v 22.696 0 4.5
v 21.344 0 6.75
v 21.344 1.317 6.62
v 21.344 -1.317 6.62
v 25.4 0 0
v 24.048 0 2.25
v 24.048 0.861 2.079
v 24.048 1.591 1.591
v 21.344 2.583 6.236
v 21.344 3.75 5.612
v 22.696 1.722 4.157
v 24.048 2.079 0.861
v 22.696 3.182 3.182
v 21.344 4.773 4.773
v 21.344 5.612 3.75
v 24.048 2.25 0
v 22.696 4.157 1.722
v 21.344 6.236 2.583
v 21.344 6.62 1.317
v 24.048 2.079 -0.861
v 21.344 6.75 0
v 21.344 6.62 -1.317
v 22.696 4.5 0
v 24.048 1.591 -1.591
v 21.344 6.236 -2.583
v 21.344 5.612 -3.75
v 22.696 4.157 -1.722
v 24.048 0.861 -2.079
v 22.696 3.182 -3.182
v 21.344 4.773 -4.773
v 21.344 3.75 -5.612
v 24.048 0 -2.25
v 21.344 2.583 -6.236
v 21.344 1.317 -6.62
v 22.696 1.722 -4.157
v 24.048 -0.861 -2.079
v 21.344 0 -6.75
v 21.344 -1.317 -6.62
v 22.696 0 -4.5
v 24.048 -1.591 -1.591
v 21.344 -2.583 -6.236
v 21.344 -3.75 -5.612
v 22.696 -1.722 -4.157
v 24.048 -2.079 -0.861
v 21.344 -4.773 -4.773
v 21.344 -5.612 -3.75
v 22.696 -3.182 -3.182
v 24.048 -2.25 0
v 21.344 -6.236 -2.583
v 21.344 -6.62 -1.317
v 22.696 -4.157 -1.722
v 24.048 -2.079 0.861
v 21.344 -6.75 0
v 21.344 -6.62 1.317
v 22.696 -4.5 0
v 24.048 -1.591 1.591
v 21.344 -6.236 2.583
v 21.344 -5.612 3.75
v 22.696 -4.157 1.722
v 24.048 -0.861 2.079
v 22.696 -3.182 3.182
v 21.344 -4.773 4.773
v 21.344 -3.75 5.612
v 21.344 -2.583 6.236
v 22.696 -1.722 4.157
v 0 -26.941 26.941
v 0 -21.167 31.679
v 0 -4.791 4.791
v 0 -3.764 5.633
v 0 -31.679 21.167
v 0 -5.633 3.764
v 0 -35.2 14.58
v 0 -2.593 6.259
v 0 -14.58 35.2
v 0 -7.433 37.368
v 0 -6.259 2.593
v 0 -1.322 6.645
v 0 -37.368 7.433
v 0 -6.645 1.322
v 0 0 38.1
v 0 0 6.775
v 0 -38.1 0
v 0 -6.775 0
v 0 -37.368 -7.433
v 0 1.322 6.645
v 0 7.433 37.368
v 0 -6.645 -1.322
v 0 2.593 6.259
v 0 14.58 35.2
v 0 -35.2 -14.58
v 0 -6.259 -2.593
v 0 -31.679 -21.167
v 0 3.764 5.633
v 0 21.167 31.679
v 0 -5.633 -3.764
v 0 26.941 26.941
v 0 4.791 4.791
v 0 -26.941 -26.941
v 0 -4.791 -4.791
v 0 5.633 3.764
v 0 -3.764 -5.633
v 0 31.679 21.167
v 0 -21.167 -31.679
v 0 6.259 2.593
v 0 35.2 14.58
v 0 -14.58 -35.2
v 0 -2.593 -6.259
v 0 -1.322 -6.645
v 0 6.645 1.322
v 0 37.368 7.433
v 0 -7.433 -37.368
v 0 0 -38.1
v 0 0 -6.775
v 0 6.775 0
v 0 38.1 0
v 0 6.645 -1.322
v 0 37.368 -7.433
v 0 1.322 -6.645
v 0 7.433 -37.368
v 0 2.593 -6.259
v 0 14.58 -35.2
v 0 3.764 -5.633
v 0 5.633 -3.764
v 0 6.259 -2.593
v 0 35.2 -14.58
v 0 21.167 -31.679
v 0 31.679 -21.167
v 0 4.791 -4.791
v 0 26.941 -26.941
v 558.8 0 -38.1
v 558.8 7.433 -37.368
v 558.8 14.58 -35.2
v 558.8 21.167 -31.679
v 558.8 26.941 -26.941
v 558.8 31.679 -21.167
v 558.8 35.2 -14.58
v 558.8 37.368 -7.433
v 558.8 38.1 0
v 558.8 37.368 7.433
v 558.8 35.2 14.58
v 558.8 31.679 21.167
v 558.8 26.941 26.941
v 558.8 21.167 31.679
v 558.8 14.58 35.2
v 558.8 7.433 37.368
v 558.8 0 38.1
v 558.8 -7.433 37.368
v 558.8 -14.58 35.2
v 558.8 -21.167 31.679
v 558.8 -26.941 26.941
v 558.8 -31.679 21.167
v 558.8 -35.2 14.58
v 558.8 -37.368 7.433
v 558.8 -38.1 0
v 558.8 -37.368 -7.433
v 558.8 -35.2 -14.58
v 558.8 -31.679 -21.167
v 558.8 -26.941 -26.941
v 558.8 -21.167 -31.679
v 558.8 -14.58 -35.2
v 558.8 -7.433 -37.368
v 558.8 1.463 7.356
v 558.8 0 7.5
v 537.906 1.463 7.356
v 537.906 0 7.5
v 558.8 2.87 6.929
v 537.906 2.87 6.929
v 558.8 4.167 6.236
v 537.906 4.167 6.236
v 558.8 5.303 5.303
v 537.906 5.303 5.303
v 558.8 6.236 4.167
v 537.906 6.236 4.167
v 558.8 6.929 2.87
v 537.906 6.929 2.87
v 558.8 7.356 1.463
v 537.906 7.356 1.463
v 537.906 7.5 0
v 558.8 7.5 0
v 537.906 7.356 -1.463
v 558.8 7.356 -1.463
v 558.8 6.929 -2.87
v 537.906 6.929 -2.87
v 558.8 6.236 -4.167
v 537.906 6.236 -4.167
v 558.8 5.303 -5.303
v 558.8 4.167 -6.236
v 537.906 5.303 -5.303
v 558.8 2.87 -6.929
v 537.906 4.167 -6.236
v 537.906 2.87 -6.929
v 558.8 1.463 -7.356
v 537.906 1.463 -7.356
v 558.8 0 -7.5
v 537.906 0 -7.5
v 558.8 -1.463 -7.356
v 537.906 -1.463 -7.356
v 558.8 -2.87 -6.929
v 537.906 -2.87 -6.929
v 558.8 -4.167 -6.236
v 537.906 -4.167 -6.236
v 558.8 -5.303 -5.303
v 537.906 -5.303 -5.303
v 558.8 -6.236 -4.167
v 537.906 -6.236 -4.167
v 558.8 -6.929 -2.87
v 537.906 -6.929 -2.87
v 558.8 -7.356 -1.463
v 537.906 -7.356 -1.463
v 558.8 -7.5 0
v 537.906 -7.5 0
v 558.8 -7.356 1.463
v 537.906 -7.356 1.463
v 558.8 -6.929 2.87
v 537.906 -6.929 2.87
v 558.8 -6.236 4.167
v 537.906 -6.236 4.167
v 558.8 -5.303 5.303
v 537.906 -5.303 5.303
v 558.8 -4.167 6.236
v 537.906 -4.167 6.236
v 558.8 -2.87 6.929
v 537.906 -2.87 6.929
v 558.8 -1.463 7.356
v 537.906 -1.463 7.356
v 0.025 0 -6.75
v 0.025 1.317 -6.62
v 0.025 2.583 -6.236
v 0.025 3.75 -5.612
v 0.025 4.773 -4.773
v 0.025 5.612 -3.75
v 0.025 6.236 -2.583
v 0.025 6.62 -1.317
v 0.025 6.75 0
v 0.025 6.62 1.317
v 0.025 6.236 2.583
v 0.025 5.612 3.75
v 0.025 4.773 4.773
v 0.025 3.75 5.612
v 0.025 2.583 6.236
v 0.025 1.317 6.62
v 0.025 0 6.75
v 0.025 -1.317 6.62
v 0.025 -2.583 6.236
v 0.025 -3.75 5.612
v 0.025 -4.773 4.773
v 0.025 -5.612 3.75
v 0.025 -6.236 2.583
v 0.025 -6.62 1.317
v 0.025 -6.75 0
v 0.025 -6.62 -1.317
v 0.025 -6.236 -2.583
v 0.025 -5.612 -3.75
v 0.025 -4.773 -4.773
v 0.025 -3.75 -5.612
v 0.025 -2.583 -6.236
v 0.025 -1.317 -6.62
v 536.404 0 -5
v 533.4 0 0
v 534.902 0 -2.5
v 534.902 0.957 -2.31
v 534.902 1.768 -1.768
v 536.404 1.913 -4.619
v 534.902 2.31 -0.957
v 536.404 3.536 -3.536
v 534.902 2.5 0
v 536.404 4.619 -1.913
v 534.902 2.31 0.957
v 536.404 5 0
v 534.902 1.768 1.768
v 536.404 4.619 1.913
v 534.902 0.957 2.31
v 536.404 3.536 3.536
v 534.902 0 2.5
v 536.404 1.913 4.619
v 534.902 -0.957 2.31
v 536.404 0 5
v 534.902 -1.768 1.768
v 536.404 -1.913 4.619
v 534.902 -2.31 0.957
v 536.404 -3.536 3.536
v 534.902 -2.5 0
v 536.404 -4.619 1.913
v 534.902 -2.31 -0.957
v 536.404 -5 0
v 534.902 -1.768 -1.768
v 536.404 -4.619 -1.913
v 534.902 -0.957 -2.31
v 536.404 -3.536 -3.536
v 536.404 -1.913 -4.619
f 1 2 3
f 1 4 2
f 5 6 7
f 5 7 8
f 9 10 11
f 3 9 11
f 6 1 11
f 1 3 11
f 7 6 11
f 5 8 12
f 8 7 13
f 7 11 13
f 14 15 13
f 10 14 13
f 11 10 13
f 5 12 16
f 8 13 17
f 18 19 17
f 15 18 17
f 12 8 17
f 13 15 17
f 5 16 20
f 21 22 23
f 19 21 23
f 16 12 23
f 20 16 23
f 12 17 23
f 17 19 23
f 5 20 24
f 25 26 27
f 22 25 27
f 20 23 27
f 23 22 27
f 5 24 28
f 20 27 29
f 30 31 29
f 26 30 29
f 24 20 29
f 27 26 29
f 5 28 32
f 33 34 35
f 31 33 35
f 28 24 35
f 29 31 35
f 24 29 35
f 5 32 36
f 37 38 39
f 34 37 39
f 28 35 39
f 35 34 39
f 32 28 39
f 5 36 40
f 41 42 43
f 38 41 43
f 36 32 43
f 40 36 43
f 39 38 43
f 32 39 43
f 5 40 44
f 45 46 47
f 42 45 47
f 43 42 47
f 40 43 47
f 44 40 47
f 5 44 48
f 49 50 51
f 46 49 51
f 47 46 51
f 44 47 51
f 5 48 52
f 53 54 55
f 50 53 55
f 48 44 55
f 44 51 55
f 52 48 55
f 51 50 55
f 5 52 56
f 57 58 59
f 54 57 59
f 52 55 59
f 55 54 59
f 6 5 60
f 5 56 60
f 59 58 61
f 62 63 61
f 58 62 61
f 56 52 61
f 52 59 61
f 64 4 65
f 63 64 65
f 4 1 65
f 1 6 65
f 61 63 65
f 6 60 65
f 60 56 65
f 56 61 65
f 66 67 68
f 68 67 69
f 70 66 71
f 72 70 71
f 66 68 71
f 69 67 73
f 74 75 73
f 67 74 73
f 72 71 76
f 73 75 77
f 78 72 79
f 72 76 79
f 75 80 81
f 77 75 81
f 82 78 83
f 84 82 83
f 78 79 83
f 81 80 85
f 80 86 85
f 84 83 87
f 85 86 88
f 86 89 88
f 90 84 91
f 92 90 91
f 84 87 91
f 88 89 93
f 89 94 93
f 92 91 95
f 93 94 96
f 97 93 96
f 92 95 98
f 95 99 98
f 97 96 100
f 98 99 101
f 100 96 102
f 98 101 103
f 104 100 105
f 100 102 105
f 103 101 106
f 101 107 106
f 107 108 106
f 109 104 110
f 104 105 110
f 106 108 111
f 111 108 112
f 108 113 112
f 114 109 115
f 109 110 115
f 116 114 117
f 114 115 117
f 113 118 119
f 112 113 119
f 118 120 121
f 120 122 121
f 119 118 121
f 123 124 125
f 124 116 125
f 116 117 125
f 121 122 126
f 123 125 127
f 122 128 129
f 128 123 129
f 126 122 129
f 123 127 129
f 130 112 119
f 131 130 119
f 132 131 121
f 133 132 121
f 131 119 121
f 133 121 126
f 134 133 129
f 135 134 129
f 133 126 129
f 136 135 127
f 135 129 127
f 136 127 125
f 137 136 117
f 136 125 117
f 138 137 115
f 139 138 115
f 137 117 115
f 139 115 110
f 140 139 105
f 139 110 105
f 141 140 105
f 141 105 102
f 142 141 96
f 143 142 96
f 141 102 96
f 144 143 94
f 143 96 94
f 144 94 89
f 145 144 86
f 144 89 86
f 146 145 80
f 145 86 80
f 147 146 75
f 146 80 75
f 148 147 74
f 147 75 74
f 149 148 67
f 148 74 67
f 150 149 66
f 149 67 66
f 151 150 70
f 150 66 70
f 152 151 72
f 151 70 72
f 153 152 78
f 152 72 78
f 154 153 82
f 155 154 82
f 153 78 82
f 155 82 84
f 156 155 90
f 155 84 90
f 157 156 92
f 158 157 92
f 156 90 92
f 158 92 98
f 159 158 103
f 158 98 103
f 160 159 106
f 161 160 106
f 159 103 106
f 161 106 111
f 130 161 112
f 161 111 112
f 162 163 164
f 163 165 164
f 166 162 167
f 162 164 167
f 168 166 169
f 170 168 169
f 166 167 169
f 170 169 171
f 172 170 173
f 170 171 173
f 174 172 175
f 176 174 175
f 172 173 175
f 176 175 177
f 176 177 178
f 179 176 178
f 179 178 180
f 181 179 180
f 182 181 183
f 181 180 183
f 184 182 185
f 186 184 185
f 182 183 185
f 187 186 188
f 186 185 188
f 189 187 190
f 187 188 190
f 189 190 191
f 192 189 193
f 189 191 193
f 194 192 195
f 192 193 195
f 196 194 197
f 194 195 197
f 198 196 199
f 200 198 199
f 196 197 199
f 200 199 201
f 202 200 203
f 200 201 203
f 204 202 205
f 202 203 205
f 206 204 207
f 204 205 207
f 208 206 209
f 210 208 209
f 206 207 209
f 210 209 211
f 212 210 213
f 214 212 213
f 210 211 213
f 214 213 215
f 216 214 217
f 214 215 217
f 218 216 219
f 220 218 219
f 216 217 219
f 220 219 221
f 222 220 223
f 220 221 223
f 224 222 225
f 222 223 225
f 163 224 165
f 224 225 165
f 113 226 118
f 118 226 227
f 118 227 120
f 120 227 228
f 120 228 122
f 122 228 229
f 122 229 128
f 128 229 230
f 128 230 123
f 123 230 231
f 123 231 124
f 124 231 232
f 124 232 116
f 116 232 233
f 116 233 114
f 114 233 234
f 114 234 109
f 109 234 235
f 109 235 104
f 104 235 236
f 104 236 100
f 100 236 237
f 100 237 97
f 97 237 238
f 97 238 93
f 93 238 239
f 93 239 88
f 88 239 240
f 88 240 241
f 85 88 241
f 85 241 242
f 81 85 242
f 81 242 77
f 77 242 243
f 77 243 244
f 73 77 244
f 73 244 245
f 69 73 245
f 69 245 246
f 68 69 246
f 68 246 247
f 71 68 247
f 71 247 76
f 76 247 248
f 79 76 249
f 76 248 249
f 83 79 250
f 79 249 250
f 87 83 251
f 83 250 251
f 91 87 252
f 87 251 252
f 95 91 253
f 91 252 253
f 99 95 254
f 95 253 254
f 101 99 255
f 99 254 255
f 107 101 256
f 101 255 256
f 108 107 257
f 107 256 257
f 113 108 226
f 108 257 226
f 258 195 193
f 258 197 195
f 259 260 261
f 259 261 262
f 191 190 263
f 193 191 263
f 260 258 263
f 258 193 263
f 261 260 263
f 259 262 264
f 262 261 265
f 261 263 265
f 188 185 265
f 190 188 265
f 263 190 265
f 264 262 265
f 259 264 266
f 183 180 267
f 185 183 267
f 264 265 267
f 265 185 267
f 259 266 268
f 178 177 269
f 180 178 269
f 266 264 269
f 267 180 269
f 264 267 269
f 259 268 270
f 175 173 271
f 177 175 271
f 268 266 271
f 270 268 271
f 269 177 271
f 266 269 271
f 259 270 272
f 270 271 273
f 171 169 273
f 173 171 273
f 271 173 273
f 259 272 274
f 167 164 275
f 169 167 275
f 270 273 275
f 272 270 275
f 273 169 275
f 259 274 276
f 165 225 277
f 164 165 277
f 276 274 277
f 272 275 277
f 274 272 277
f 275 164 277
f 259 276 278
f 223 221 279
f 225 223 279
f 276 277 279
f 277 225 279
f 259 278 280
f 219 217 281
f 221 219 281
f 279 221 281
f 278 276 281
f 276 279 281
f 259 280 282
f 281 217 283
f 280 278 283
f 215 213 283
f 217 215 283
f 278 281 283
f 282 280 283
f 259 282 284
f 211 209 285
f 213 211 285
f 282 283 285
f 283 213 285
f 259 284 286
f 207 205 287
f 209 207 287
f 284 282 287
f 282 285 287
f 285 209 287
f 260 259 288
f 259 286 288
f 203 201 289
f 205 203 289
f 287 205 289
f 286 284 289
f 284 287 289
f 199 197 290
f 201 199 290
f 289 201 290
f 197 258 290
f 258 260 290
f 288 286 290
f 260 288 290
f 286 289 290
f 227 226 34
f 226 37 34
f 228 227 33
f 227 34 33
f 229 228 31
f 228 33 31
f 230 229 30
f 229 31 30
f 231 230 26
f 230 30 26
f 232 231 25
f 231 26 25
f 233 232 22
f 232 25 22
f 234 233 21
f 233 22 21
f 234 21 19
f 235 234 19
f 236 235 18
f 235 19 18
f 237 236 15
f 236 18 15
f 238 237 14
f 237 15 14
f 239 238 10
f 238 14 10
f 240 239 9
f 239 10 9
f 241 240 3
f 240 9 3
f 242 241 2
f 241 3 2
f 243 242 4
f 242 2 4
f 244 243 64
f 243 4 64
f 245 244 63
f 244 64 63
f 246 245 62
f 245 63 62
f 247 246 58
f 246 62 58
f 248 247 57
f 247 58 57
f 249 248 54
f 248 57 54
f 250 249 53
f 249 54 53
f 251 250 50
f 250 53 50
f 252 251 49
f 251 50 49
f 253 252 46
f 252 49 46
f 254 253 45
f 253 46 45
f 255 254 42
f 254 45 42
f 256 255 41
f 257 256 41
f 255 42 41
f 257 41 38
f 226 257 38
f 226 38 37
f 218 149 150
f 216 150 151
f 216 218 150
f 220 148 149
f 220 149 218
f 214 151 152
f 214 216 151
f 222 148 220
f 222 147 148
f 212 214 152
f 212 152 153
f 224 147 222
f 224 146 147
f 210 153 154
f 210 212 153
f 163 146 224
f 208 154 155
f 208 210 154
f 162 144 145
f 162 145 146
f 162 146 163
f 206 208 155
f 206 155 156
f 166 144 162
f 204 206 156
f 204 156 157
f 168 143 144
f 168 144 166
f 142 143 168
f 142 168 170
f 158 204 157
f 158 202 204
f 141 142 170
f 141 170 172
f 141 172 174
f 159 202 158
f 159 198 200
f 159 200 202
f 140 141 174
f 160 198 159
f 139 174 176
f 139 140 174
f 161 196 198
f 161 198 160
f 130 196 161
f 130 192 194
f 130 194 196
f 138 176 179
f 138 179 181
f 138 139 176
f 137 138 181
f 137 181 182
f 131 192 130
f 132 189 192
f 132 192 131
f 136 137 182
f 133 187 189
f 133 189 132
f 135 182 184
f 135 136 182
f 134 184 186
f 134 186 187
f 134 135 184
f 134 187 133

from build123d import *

# Parameters (mm, degrees)
SKETCH1_R                       = 38.1
BOSS_EXTRUDE1_DEPTH             = 558.8
M12_CLEARANCE_HOLE1_D           = 13.5
M12_CLEARANCE_HOLE1_DEPTH       = 21.344190822
M12_CLEARANCE_HOLE1_CSINK_D     = 13.55
M12_CLEARANCE_HOLE1_CSINK_ANGLE = 90
M12_CLEARANCE_HOLE1_TIP         = 4.055809178
M12_CLEARANCE_HOLE2_D           = 15
M12_CLEARANCE_HOLE2_DEPTH       = 20.893545357
M12_CLEARANCE_HOLE2_TIP         = 4.506454643


with BuildPart() as part:
    # Sketch1 → Boss-Extrude1 (new body)
    with BuildSketch(Plane(origin=(0, 0, 0), x_dir=(0, 0, -1), z_dir=(1, 0, 0))):
        Circle(SKETCH1_R)
    extrude(amount=BOSS_EXTRUDE1_DEPTH)

    # M12 Clearance Hole1
    with Locations(Plane.ZY):
        with Locations((0, 0)):
            CounterSinkHole(M12_CLEARANCE_HOLE1_D / 2, M12_CLEARANCE_HOLE1_CSINK_D / 2, depth=M12_CLEARANCE_HOLE1_DEPTH, counter_sink_angle=M12_CLEARANCE_HOLE1_CSINK_ANGLE)
            with Locations((0, 0, -(M12_CLEARANCE_HOLE1_DEPTH + M12_CLEARANCE_HOLE1_TIP / 2))):  # 118° drill point
                Cone(0, M12_CLEARANCE_HOLE1_D / 2, M12_CLEARANCE_HOLE1_TIP, mode=Mode.SUBTRACT)

    # M12 Clearance Hole2
    with Locations(Plane(origin=(558.8, 0, 0), x_dir=(0, 0, -1), z_dir=(1, 0, 0))):
        with Locations((0, 0)):
            Hole(M12_CLEARANCE_HOLE2_D / 2, depth=M12_CLEARANCE_HOLE2_DEPTH)
            with Locations((0, 0, -(M12_CLEARANCE_HOLE2_DEPTH + M12_CLEARANCE_HOLE2_TIP / 2))):  # 118° drill point
                Cone(0, M12_CLEARANCE_HOLE2_D / 2, M12_CLEARANCE_HOLE2_TIP, mode=Mode.SUBTRACT)


solid = part.part
